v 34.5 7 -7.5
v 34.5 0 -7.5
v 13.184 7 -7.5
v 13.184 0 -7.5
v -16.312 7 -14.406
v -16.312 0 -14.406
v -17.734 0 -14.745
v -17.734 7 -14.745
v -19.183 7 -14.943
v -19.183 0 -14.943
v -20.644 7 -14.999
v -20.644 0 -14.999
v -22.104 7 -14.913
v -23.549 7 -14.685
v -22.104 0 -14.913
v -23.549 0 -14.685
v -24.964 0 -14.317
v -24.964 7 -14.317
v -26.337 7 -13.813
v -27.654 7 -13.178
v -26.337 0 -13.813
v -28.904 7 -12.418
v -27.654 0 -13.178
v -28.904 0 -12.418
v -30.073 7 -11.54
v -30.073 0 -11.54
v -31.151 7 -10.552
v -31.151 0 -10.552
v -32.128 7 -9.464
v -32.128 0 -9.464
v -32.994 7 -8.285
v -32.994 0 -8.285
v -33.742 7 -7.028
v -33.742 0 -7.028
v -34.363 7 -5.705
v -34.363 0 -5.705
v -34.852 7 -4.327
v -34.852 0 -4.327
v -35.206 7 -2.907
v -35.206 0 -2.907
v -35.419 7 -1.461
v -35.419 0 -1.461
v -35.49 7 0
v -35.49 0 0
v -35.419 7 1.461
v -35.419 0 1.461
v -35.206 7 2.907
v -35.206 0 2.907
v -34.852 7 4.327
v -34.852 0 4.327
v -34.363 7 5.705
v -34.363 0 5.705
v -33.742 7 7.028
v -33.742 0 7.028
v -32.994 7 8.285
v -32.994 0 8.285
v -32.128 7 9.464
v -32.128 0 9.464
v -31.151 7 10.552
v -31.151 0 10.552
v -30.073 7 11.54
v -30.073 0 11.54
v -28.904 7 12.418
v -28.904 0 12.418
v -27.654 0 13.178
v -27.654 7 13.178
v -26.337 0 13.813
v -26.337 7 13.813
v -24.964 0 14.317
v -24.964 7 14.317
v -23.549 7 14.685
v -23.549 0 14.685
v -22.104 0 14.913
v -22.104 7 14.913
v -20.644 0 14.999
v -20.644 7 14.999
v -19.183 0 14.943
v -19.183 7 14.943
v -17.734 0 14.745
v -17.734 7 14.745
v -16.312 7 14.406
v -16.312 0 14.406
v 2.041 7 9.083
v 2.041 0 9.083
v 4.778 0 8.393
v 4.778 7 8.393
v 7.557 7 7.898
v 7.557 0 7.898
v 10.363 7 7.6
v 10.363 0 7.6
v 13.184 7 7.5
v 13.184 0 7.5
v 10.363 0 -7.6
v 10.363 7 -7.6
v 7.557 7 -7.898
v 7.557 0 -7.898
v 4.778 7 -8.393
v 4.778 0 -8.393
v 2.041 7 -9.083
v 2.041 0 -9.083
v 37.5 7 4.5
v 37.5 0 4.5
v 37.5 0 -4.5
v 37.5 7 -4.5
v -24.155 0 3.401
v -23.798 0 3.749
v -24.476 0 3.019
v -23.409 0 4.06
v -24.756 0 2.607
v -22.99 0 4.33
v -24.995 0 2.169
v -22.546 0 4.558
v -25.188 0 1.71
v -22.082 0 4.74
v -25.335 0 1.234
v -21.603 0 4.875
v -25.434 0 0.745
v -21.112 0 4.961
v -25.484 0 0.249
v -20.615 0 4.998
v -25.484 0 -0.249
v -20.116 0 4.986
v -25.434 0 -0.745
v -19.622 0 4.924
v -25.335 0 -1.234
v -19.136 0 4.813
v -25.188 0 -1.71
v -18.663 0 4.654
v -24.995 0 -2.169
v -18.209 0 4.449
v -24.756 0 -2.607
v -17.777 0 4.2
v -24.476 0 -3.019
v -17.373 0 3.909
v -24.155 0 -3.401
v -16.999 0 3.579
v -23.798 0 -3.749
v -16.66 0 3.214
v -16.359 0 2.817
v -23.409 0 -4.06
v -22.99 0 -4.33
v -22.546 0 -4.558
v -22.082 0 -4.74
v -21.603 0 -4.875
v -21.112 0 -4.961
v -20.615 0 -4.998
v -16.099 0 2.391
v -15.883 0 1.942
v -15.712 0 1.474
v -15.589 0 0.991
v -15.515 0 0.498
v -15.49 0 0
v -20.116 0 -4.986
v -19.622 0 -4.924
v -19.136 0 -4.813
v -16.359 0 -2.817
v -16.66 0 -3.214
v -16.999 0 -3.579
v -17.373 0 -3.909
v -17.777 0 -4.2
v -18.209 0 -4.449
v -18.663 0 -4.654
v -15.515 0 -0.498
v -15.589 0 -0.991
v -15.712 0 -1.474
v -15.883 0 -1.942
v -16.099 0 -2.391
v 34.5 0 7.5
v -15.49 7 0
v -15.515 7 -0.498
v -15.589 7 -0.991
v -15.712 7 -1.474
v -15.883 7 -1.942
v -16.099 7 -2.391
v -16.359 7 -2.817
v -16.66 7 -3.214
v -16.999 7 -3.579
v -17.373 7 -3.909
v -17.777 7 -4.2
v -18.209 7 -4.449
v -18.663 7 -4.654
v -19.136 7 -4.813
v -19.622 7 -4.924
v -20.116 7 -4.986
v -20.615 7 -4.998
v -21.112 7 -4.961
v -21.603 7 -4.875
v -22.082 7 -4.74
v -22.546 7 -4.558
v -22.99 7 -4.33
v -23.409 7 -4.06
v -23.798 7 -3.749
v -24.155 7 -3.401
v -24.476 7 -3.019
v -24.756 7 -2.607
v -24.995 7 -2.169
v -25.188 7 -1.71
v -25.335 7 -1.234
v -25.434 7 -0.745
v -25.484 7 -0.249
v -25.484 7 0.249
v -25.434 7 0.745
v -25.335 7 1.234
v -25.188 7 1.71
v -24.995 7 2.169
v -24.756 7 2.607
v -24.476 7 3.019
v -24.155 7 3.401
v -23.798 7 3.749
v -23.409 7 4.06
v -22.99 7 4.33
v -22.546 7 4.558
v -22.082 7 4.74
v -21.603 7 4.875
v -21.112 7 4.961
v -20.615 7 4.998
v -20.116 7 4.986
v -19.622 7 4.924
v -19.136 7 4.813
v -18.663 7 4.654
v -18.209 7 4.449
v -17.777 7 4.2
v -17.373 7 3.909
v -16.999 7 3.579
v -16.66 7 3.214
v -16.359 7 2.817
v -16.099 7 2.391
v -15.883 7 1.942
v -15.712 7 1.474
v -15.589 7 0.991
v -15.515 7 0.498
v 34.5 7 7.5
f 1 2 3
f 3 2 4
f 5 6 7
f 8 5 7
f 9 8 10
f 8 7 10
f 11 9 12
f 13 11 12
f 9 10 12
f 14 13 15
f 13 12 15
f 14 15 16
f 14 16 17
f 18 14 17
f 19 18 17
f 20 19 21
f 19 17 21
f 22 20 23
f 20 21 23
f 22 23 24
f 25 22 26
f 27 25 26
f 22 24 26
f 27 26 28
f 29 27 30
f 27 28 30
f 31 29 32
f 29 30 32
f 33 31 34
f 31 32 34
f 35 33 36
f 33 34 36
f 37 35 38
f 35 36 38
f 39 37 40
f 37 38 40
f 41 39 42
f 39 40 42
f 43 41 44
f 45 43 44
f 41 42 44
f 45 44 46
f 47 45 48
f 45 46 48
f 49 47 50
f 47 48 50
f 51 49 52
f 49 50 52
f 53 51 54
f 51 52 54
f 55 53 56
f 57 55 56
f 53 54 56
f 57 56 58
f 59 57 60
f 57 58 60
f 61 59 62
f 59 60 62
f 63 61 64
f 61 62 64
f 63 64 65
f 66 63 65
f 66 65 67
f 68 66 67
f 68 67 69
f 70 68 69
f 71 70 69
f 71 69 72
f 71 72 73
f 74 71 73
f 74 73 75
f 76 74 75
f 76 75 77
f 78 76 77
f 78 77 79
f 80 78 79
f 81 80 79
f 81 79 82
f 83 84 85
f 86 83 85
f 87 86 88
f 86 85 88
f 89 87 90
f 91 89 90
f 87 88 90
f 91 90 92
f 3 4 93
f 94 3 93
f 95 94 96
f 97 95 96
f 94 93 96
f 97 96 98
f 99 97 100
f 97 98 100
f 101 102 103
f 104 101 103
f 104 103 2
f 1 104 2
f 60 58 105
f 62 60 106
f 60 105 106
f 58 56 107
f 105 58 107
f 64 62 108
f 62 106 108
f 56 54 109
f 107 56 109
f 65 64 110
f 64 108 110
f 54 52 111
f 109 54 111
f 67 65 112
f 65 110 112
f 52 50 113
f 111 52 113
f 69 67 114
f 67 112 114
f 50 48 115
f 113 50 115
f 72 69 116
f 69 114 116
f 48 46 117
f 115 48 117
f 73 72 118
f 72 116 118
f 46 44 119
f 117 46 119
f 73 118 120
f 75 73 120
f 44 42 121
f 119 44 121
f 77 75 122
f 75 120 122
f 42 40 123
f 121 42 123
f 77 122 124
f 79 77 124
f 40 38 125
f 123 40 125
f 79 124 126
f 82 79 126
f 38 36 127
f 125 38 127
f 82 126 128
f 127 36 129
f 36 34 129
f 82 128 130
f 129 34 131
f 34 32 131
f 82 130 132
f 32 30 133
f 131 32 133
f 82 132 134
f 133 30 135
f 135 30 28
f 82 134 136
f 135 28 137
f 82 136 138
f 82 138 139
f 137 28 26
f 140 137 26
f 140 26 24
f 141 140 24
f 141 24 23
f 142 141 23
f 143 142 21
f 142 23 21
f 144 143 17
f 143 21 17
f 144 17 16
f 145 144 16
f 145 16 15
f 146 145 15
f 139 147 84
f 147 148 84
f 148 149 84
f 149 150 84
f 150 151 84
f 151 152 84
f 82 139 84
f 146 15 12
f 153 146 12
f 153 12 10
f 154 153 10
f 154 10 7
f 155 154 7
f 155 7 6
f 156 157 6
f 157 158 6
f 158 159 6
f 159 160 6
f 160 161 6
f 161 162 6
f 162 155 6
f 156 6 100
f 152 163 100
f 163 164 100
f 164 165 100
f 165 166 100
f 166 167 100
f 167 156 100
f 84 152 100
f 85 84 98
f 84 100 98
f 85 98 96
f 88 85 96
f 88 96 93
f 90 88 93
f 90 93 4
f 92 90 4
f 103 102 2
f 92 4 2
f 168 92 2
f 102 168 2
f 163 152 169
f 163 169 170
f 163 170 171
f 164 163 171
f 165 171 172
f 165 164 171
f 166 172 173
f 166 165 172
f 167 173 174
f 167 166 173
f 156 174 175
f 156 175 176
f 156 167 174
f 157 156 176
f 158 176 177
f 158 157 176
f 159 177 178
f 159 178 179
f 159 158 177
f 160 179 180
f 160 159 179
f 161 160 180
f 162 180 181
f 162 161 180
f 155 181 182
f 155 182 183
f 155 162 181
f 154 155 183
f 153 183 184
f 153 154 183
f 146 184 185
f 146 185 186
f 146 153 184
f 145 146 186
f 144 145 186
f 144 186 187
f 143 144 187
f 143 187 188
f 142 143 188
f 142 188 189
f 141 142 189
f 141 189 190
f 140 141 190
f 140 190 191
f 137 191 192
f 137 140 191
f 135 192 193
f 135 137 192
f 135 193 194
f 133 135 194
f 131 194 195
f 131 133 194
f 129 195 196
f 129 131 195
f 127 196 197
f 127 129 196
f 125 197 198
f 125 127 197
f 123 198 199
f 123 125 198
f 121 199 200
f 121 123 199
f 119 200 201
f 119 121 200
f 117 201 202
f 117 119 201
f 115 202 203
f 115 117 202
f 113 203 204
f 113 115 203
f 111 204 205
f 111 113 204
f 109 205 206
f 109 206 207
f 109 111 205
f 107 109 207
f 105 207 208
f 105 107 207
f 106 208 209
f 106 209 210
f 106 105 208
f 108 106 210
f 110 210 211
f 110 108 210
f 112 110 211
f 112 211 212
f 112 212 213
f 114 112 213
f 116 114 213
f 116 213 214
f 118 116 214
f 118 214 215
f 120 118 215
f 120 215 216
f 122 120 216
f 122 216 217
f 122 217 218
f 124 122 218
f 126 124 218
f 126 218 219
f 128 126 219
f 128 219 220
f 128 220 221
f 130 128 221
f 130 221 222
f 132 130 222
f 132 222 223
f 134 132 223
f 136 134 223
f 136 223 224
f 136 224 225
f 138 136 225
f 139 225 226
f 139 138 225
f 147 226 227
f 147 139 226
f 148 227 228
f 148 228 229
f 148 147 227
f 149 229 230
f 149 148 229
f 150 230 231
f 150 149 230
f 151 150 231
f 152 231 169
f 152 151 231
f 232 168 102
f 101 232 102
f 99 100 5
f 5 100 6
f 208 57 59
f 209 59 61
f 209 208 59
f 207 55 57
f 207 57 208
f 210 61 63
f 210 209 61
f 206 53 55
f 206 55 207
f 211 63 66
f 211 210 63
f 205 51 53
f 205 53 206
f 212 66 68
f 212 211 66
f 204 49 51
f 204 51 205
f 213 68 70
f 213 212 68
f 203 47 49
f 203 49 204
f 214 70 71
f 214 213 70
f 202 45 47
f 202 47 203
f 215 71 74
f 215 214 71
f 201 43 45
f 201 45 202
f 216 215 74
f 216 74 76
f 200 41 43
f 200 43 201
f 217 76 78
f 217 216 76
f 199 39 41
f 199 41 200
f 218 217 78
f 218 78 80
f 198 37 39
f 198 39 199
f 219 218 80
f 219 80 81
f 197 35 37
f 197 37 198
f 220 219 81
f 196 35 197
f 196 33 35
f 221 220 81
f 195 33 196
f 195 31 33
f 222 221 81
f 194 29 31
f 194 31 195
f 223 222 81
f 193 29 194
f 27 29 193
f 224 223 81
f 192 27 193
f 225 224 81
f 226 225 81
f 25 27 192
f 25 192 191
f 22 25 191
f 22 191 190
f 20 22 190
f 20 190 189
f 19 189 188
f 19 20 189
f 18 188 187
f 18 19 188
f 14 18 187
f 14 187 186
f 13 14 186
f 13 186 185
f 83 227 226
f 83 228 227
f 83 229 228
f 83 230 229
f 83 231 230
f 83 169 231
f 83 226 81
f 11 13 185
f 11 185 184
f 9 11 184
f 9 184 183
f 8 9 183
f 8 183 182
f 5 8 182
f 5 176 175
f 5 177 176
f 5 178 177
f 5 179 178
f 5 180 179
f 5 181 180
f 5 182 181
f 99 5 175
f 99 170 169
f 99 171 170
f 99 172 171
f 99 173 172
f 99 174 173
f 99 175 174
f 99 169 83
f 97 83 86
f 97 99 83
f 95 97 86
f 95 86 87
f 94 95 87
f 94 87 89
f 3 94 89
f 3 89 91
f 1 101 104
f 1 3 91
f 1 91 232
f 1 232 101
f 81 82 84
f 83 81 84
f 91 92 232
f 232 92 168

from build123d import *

# Parameters (mm, degrees)
SKETCH1_R           = 5
BOSS_EXTRUDE1_DEPTH = 7


with BuildPart() as part:
    # Sketch1 → Boss-Extrude1 (new body)
    with BuildSketch(Plane(origin=(0, 0, 0), x_dir=(1, 0, 0), z_dir=(0, 1, 0))):
        with BuildLine():
            Line((37.5, -4.5), (37.5, 4.5))
            Line((37.5, 4.5), (34.5, 7.5))
            Line((34.5, 7.5), (13.183654114, 7.5))
            ThreePointArc((13.183654114, 7.5), (7.556521898, 7.89778563), (2.041309299, 9.083230849))
            Line((2.041309299, 9.083230849), (-16.311620694, 14.406288432))
            ThreePointArc((-16.311620694, 14.406288432), (-35.49, 0), (-16.311620694, -14.406288432))
            Line((-16.311620694, -14.406288432), (2.041309299, -9.083230849))
            ThreePointArc((2.041309299, -9.083230849), (7.556521898, -7.89778563), (13.183654114, -7.5))
            Line((13.183654114, -7.5), (34.5, -7.5))
            Line((34.5, -7.5), (37.5, -4.5))
        make_face()
        with Locations((-20.49, 0)):
            Circle(SKETCH1_R, mode=Mode.SUBTRACT)
    extrude(amount=BOSS_EXTRUDE1_DEPTH)


solid = part.part
